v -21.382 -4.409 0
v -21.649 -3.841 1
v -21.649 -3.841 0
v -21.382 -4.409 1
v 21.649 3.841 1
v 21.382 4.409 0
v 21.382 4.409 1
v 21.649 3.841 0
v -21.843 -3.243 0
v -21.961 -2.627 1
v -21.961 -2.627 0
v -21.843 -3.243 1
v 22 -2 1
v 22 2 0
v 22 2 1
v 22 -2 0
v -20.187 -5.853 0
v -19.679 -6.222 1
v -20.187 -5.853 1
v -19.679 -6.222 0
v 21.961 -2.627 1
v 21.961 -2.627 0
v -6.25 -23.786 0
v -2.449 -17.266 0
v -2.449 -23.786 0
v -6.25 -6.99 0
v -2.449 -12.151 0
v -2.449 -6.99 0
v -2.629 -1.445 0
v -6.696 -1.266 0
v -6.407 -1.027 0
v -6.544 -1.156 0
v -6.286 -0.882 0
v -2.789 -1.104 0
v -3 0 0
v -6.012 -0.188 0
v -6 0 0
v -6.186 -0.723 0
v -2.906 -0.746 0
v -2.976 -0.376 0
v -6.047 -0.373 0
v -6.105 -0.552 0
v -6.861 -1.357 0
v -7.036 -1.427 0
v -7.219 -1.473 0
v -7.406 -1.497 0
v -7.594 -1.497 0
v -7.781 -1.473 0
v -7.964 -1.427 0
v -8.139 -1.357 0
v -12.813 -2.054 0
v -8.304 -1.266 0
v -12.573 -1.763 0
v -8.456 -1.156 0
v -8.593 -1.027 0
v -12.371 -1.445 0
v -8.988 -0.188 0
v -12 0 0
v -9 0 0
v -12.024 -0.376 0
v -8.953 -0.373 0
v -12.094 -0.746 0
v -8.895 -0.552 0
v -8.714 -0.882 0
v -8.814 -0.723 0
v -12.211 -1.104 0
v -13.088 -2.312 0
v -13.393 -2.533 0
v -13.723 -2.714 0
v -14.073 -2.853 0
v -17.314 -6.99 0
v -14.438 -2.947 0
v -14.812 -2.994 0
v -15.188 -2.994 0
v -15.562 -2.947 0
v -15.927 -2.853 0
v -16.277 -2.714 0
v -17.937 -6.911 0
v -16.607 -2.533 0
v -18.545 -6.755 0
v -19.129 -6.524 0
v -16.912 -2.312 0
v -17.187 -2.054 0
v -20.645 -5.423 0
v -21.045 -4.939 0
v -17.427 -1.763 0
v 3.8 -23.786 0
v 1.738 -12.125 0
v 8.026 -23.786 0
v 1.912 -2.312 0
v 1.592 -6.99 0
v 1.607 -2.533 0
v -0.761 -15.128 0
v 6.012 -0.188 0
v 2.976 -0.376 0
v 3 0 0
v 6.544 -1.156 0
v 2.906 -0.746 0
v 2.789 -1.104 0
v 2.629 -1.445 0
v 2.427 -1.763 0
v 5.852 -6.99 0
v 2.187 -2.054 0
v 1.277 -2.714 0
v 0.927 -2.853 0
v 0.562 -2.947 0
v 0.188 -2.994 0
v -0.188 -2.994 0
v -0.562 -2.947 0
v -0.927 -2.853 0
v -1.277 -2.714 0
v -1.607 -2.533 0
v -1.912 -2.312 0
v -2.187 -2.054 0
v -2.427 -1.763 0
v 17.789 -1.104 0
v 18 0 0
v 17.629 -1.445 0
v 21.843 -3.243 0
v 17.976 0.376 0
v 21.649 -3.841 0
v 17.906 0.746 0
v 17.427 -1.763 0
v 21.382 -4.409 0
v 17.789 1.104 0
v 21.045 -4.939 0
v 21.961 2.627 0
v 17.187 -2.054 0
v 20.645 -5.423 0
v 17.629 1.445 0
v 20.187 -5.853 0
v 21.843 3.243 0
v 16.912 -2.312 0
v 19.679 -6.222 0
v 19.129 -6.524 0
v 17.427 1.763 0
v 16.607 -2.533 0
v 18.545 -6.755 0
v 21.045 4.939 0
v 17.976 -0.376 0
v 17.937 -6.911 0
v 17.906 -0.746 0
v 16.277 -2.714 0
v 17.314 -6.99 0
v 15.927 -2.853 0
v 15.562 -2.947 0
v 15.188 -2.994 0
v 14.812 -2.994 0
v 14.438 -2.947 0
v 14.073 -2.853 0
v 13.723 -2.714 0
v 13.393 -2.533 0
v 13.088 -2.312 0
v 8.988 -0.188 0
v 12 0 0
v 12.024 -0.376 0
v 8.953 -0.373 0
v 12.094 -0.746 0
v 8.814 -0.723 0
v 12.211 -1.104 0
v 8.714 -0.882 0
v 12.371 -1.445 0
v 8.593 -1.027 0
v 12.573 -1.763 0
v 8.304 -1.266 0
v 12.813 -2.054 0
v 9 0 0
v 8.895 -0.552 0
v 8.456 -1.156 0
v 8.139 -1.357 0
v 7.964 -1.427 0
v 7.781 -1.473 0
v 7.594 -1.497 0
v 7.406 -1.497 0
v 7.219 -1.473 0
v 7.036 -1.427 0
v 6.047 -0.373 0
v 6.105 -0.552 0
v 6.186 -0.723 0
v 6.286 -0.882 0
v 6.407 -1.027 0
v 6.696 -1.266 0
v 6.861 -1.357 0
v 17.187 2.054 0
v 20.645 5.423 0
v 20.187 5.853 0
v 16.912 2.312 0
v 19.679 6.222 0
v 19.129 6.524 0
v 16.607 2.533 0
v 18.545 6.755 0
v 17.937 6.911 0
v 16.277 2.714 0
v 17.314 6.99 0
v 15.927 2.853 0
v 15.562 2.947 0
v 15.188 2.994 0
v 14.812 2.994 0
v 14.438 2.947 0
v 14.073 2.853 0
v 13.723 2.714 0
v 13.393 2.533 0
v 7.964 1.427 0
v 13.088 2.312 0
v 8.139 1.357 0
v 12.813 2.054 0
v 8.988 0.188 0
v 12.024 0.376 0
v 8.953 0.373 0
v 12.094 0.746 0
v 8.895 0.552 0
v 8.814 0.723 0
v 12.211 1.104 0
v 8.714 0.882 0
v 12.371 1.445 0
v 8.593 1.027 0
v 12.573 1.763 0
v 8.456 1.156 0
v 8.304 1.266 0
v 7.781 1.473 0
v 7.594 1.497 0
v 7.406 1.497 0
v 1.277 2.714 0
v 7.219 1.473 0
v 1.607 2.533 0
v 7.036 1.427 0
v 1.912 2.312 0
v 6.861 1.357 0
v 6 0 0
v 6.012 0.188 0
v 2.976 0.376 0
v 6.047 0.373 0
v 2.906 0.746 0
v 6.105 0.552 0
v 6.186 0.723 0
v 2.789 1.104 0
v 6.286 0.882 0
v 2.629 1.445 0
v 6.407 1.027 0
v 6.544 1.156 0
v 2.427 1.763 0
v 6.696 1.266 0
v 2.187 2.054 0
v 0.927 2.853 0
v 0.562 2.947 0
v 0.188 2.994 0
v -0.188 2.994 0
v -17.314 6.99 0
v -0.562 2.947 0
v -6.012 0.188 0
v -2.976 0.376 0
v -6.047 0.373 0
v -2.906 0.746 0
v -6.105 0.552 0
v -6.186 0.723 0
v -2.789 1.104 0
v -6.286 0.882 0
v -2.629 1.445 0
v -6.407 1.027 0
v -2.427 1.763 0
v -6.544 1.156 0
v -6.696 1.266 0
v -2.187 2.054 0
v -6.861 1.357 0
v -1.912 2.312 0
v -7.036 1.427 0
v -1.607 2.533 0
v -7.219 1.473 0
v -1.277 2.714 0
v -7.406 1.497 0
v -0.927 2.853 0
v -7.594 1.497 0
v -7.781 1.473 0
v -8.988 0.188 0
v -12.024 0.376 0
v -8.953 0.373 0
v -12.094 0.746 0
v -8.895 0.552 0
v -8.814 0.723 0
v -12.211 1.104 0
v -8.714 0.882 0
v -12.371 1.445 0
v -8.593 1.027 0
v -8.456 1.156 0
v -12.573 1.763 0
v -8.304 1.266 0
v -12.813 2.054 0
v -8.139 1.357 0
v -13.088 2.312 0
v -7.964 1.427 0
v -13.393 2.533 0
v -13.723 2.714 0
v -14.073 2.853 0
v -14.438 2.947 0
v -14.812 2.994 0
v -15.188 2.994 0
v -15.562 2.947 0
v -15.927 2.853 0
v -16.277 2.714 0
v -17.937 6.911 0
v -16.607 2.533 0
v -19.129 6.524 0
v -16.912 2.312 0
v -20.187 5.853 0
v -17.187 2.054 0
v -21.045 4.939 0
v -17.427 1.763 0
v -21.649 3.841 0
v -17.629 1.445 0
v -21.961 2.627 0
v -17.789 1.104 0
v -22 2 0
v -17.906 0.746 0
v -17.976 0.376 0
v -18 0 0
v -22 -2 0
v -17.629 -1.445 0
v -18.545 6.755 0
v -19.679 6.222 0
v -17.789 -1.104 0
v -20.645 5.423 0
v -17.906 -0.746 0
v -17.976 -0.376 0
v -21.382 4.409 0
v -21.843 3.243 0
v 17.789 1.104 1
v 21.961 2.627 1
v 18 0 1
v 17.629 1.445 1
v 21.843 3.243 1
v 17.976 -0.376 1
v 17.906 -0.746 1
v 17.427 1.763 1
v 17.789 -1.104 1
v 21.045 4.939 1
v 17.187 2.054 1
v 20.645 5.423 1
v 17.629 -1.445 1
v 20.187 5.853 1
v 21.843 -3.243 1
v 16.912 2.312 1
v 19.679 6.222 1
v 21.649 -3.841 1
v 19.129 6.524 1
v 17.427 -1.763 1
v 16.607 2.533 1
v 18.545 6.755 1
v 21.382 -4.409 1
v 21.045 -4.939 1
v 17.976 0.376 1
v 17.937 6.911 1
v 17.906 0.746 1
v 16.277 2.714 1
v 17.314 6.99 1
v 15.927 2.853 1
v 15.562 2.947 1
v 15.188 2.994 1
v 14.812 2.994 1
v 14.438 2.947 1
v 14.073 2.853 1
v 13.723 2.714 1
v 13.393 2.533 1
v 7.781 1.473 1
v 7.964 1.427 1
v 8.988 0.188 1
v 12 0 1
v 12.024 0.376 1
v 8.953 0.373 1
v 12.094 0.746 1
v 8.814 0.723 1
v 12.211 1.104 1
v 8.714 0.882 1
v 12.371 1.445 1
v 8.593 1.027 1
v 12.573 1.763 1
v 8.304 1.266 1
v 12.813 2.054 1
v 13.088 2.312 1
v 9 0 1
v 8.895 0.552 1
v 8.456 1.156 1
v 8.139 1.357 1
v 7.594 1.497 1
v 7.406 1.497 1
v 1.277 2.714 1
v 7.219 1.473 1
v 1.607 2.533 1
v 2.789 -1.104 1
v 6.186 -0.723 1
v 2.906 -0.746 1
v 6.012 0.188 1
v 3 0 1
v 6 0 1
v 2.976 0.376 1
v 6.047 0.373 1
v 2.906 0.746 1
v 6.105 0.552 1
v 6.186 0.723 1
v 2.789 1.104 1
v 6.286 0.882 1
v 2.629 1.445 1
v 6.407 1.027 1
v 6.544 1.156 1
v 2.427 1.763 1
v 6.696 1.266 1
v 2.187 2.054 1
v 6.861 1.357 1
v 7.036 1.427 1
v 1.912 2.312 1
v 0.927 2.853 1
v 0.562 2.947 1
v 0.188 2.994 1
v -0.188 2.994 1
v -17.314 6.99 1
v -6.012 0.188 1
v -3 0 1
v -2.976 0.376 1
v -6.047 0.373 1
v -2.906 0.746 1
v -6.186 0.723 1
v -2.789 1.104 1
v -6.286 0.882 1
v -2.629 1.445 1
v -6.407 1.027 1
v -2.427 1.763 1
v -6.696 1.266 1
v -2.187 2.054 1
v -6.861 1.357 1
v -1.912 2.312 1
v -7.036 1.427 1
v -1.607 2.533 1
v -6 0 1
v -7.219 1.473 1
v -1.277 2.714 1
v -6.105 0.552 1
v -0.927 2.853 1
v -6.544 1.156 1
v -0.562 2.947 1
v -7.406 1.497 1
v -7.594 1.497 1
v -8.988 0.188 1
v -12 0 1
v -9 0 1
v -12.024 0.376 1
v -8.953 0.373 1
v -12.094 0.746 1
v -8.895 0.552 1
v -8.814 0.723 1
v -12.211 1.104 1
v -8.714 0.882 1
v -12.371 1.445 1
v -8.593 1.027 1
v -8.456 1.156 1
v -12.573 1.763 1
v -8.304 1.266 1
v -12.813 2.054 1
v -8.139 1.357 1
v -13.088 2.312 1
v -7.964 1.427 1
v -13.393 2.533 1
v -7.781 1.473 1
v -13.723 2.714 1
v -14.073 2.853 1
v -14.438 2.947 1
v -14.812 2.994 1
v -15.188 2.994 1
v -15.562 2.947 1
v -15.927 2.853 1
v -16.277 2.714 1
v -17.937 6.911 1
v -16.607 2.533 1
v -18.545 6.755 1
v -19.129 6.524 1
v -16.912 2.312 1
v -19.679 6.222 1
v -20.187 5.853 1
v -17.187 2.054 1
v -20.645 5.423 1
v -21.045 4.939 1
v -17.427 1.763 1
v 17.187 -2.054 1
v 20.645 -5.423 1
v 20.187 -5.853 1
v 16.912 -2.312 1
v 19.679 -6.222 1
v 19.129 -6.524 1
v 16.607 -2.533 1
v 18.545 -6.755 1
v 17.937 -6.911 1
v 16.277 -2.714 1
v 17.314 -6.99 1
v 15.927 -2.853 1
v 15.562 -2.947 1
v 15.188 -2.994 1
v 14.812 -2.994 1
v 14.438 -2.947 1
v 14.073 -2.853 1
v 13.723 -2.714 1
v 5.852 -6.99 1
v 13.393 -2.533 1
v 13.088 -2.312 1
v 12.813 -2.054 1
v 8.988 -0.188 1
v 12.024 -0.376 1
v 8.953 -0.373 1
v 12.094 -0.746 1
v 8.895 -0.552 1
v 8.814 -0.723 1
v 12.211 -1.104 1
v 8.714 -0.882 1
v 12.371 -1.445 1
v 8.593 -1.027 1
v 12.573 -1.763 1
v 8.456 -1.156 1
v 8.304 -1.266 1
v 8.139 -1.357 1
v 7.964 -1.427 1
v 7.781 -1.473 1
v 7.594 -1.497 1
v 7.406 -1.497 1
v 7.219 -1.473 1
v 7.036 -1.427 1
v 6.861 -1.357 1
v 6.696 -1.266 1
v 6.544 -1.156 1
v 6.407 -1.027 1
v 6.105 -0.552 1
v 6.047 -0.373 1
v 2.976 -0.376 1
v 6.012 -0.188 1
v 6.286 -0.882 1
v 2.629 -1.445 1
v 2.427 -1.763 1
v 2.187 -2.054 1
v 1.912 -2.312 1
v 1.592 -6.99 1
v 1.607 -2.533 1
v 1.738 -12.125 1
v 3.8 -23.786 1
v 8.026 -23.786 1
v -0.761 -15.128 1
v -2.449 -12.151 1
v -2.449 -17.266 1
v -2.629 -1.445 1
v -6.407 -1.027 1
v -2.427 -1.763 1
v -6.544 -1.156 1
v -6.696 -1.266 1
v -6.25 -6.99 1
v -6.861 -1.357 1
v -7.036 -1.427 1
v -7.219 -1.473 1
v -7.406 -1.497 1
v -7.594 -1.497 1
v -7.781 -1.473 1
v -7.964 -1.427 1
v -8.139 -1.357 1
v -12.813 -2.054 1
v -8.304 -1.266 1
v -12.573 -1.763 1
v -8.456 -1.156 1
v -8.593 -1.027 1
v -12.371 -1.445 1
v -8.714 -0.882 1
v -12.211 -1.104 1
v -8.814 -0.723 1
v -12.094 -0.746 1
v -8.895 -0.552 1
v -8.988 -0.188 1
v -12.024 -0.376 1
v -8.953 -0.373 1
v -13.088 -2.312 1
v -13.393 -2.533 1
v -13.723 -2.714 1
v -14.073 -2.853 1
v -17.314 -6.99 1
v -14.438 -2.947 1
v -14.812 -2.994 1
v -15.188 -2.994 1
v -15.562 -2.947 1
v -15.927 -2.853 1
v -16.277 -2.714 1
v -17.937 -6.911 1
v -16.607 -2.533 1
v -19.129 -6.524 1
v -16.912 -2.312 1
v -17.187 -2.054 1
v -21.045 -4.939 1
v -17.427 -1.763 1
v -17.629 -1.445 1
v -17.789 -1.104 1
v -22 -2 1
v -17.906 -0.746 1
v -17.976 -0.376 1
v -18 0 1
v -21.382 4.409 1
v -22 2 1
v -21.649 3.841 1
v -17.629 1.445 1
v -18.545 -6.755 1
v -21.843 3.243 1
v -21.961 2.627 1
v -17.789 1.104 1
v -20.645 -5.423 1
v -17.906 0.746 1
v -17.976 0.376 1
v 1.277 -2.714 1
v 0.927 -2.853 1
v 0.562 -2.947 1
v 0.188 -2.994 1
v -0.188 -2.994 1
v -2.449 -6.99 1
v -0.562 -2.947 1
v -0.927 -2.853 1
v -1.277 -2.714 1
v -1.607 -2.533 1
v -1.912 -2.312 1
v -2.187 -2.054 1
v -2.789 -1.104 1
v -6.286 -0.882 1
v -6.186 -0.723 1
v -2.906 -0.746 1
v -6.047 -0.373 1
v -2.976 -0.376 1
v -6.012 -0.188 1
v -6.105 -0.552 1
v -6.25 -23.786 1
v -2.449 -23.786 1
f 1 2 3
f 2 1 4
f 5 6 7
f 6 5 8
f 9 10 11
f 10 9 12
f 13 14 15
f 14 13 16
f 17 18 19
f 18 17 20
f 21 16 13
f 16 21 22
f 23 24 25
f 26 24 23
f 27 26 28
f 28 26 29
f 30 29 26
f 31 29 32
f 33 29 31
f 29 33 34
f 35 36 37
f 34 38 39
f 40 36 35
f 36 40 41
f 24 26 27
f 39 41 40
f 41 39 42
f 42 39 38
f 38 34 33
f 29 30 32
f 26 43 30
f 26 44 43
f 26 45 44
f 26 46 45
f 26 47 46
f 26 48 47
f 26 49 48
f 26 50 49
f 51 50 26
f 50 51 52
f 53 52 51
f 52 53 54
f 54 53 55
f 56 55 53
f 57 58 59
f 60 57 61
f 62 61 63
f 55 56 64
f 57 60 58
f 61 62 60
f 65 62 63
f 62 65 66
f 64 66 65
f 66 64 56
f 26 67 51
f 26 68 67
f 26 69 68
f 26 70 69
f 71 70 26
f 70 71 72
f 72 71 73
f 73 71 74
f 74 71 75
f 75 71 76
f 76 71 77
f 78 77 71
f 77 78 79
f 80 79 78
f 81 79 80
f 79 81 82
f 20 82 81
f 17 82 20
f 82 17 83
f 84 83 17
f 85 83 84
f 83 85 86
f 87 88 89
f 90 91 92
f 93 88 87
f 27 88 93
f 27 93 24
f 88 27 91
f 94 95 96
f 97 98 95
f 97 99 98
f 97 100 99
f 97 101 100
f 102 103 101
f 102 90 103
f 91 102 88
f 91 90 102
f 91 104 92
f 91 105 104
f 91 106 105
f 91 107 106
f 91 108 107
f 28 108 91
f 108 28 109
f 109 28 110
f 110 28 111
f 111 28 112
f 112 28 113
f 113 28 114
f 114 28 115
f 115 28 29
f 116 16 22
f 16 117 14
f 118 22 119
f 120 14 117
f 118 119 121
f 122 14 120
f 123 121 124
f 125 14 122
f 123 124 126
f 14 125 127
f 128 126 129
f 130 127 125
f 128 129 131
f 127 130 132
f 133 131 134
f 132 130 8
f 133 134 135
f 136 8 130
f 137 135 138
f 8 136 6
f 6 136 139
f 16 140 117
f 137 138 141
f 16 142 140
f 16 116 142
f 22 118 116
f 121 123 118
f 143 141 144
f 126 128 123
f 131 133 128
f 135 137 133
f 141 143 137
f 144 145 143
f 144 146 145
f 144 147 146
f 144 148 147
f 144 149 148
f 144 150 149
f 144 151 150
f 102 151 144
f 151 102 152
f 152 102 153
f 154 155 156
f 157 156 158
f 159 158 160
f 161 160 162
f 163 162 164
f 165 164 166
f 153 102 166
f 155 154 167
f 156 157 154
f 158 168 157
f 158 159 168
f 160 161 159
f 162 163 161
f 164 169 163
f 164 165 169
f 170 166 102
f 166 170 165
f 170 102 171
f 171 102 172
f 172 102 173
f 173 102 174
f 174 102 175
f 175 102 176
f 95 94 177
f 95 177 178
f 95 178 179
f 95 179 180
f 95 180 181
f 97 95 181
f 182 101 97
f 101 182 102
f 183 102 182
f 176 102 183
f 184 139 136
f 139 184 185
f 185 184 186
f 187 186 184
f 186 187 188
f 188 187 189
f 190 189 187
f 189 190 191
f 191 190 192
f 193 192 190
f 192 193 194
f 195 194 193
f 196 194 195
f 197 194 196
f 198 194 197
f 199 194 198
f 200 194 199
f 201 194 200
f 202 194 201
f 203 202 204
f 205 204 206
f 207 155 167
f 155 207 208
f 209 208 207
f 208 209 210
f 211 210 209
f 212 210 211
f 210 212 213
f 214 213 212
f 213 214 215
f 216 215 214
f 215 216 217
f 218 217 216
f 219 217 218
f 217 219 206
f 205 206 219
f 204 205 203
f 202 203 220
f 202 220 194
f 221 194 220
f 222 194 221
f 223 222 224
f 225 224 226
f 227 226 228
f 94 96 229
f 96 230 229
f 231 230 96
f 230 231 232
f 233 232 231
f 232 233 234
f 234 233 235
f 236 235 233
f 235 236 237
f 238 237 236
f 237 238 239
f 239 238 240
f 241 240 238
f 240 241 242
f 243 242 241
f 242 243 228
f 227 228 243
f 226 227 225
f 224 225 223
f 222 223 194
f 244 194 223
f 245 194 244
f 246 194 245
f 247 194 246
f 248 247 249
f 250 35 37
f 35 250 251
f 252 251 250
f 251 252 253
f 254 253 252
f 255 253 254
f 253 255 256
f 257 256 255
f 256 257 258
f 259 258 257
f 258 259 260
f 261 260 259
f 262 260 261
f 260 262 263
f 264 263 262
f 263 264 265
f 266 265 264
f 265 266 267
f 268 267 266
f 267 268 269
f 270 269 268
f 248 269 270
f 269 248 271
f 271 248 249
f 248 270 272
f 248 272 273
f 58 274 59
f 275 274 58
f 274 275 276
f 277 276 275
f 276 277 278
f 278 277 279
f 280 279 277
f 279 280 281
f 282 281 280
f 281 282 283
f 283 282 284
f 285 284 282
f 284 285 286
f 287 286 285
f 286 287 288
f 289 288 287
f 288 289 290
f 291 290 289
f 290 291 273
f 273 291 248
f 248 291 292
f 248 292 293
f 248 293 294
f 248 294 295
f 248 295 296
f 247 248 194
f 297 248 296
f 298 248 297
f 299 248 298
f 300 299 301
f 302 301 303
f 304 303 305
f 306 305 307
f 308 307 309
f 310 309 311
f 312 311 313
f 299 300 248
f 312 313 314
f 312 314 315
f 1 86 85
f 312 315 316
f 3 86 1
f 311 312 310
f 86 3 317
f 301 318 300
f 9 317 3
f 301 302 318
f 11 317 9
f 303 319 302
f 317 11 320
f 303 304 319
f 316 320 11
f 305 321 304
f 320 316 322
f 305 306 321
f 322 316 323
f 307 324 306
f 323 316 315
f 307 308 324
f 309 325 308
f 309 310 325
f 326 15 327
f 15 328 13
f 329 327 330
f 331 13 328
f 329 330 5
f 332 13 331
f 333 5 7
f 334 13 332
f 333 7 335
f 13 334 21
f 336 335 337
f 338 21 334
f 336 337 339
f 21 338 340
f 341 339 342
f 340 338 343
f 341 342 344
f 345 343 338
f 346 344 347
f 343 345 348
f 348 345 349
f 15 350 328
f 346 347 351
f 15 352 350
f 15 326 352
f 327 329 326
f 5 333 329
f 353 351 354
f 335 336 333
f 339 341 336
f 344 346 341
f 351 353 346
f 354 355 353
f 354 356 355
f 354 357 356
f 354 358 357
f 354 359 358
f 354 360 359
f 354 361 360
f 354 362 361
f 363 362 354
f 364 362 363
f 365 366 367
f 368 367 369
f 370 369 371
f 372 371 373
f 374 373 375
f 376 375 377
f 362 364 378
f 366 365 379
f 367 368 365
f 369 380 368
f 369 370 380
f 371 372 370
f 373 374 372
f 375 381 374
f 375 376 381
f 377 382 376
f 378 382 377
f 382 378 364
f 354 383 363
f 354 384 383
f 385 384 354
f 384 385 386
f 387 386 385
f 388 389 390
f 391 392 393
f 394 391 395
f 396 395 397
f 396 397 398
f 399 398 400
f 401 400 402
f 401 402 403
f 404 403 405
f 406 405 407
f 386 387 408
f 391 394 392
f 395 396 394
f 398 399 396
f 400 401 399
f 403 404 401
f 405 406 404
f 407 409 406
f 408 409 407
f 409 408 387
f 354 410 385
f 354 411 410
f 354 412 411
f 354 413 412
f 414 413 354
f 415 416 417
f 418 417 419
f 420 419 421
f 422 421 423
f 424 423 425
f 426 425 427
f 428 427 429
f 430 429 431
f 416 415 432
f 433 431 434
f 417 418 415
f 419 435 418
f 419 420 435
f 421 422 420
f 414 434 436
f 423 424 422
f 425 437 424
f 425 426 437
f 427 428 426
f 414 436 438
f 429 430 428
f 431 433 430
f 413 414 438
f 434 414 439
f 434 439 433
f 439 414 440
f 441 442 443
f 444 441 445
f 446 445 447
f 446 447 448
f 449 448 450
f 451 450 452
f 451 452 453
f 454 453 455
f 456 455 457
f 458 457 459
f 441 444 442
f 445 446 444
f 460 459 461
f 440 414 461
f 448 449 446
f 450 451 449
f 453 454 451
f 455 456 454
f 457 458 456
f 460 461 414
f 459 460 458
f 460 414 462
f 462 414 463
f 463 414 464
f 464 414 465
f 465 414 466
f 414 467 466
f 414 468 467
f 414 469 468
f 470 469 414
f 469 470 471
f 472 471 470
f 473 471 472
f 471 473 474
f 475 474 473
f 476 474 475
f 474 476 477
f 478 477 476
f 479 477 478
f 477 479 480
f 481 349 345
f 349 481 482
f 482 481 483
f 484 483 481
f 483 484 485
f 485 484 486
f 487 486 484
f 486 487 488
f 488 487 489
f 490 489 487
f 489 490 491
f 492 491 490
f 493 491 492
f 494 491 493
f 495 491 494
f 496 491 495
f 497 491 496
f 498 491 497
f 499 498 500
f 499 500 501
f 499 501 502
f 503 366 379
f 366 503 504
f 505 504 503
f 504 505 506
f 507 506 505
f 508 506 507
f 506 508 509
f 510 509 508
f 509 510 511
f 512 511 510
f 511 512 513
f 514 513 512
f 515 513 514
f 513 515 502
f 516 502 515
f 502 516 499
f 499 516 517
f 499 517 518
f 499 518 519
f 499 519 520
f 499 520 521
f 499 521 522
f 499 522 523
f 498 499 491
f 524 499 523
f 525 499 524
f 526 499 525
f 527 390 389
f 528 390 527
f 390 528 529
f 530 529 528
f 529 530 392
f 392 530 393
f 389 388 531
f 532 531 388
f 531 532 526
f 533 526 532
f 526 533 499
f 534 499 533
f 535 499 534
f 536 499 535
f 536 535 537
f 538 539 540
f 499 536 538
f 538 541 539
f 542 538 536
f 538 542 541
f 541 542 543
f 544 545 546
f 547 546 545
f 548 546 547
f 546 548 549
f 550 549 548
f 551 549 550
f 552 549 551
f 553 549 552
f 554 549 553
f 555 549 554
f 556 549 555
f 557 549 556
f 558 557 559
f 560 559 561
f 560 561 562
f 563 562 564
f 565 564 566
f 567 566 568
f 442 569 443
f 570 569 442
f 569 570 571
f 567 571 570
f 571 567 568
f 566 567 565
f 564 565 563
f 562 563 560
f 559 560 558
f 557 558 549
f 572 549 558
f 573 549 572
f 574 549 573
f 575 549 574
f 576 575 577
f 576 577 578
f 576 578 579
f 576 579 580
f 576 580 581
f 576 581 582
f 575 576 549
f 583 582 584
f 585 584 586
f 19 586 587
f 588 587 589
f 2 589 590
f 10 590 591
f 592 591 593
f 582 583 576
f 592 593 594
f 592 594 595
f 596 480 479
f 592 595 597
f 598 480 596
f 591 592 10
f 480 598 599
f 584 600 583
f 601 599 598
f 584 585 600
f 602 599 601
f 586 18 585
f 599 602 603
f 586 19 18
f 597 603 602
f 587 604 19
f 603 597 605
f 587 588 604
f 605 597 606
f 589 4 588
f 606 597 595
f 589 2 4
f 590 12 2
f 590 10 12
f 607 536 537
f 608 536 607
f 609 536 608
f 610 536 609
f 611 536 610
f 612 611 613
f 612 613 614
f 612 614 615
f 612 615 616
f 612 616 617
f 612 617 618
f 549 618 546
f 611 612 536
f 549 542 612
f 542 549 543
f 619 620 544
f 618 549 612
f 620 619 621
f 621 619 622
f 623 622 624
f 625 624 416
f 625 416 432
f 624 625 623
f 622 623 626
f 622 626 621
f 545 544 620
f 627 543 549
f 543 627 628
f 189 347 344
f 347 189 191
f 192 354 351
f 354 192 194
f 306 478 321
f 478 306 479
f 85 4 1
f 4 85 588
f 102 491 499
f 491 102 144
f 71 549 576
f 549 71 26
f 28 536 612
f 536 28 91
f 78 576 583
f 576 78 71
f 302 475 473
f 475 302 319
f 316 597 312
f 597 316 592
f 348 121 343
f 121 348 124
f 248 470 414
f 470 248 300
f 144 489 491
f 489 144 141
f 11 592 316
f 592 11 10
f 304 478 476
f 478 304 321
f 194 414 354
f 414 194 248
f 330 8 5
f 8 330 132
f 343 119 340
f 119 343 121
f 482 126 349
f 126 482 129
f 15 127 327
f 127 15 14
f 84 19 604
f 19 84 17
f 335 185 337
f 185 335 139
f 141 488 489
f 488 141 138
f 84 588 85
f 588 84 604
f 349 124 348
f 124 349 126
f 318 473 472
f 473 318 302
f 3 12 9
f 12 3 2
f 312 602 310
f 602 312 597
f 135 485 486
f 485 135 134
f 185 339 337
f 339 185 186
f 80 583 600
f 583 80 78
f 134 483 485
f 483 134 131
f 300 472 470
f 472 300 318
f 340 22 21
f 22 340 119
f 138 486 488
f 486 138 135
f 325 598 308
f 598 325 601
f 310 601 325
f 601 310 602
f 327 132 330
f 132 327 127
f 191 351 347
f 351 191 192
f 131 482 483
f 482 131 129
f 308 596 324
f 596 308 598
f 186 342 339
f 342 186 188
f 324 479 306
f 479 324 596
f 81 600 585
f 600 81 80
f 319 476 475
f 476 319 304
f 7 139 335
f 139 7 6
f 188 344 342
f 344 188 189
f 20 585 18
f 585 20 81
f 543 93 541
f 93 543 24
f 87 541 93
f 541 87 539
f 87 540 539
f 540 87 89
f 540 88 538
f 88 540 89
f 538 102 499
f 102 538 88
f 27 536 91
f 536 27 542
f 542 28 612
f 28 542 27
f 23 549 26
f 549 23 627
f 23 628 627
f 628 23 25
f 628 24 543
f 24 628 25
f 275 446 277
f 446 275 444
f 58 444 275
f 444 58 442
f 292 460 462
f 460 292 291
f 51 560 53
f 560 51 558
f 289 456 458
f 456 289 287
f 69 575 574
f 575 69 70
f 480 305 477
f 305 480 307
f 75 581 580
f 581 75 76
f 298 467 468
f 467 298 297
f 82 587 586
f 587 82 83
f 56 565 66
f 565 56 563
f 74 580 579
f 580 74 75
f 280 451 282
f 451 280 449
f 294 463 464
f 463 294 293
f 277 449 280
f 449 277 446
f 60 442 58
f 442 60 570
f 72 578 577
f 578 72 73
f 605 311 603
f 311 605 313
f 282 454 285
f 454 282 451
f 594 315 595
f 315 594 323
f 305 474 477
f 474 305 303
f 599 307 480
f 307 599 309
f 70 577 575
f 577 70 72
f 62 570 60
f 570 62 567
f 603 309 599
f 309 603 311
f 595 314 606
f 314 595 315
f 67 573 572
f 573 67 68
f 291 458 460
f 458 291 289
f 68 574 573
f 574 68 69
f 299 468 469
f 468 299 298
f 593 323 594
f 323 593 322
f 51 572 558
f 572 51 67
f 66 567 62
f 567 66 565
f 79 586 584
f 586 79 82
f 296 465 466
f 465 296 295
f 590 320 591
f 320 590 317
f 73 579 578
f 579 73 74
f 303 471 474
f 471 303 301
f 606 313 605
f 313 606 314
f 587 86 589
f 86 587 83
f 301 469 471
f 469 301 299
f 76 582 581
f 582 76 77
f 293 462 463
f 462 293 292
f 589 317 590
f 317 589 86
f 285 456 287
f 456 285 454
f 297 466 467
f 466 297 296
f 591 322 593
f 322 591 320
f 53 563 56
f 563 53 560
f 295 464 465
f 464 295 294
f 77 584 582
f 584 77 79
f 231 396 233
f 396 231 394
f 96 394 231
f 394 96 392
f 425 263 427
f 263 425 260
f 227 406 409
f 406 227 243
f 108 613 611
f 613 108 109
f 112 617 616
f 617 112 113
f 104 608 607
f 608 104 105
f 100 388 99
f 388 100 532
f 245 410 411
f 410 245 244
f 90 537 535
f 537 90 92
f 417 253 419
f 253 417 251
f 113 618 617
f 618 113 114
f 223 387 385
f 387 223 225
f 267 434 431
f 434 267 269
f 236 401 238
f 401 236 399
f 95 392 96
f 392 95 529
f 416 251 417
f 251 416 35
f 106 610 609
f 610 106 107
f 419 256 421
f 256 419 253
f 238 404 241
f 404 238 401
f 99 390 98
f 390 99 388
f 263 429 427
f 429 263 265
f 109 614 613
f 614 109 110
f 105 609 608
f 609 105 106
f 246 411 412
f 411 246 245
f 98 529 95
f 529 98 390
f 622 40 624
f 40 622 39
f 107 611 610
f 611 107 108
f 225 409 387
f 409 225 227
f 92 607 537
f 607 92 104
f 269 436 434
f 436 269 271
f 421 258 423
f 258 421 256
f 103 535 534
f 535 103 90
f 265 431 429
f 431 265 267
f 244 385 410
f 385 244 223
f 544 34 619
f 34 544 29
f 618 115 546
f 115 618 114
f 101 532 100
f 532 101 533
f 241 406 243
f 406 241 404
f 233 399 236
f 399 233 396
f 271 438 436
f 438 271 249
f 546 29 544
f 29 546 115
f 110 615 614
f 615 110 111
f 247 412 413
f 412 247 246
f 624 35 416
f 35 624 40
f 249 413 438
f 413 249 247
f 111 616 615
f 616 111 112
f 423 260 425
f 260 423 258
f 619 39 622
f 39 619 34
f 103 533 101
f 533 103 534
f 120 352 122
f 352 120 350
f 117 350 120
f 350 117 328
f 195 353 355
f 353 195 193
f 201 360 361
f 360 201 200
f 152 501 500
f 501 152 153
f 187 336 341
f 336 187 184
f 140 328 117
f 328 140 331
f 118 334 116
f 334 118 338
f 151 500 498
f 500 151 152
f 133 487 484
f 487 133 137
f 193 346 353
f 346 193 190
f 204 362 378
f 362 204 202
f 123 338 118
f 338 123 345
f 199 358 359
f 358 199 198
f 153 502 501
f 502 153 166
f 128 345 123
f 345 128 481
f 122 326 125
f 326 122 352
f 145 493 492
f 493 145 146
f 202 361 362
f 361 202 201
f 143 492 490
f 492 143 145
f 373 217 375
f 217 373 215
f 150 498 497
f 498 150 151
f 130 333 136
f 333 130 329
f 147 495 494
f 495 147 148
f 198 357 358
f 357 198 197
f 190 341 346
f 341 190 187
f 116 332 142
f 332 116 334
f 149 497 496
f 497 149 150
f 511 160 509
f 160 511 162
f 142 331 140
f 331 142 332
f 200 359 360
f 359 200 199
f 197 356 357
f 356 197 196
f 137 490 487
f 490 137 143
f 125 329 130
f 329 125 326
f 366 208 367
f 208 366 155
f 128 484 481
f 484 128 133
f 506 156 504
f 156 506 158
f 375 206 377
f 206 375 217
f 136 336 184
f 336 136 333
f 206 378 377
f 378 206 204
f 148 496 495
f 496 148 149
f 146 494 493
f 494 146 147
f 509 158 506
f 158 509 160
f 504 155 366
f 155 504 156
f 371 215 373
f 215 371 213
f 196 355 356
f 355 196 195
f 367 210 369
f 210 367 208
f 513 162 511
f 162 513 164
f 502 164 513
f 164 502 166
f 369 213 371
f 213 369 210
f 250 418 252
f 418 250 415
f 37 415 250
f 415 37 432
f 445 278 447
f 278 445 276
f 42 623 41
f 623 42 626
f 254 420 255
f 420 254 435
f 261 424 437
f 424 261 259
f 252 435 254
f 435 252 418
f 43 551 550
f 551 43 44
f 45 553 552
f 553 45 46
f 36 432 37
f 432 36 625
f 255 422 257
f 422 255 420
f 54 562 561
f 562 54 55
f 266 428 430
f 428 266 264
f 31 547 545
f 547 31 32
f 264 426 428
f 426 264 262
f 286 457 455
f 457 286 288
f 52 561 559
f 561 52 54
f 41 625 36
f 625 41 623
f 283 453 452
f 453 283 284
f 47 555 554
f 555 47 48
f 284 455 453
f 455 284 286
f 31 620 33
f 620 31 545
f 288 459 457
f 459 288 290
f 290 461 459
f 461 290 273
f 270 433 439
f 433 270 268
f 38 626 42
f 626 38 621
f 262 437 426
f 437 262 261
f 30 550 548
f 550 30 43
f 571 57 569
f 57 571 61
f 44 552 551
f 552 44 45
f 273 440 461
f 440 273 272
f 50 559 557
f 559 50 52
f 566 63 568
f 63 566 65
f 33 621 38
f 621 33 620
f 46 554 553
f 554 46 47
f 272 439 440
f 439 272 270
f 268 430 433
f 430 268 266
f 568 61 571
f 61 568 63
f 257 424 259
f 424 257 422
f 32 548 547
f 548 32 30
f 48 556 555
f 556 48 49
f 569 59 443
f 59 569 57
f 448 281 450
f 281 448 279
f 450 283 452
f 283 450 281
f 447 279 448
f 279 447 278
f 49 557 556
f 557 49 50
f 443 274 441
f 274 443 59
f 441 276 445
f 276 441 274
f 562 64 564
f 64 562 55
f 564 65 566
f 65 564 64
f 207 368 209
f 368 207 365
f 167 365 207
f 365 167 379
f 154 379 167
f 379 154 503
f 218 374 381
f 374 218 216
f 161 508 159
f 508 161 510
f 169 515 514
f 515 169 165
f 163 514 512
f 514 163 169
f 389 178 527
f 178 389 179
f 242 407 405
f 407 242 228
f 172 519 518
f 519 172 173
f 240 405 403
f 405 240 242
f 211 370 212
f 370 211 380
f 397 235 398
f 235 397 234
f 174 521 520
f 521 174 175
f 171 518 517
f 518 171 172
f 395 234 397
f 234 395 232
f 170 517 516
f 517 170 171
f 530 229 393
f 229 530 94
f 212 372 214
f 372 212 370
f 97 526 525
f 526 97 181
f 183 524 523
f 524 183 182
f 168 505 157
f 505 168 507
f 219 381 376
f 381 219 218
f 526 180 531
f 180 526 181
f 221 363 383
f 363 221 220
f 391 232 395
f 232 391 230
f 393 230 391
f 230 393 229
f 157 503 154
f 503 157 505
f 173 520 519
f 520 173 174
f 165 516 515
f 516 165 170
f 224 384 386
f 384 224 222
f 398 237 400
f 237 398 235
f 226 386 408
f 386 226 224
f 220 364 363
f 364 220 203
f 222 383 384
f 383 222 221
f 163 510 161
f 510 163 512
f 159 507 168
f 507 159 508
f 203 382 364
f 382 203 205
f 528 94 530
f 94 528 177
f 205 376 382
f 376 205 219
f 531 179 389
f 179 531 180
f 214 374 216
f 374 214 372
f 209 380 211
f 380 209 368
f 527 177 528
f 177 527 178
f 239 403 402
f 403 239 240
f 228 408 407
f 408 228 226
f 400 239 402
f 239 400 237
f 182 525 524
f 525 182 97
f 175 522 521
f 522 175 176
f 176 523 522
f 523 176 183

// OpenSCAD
$fn = 50;


difference() {
	union() {
		hull() {
			translate(v = [-17.0000000000, 2.0000000000, 0]) {
				cylinder(h = 1, r = 5);
			}
			translate(v = [17.0000000000, 2.0000000000, 0]) {
				cylinder(h = 1, r = 5);
			}
			translate(v = [-17.0000000000, -2.0000000000, 0]) {
				cylinder(h = 1, r = 5);
			}
			translate(v = [17.0000000000, -2.0000000000, 0]) {
				cylinder(h = 1, r = 5);
			}
		}
		translate(v = [0, -5, 0]) {
			linear_extrude(height = 1) {
				text(font = "DejaVu Sans Mono:style=Bold", halign = "center", size = 19.0000000000, text = "K", valign = "top");
			}
		}
	}
	union() {
		translate(v = [-15.0000000000, 0.0000000000, 0]) {
			translate(v = [0, 0, -100]) {
				cylinder(h = 200, r = 3.0000000000);
			}
		}
		translate(v = [0, 0, -100]) {
			cylinder(h = 200, r = 3.0000000000);
		}
		translate(v = [15.0000000000, 0.0000000000, 0]) {
			translate(v = [0, 0, -100]) {
				cylinder(h = 200, r = 3.0000000000);
			}
		}
		translate(v = [-15.0000000000, 0.0000000000, 0]) {
			translate(v = [0, 0, -100]) {
				cylinder(h = 200, r = 1.5000000000);
			}
		}
		translate(v = [-7.5000000000, 0.0000000000, 0]) {
			translate(v = [0, 0, -100]) {
				cylinder(h = 200, r = 1.5000000000);
			}
		}
		translate(v = [0, 0, -100]) {
			cylinder(h = 200, r = 1.5000000000);
		}
		translate(v = [7.5000000000, 0.0000000000, 0]) {
			translate(v = [0, 0, -100]) {
				cylinder(h = 200, r = 1.5000000000);
			}
		}
		translate(v = [15.0000000000, 0.0000000000, 0]) {
			translate(v = [0, 0, -100]) {
				cylinder(h = 200, r = 1.5000000000);
			}
		}
	}
}
